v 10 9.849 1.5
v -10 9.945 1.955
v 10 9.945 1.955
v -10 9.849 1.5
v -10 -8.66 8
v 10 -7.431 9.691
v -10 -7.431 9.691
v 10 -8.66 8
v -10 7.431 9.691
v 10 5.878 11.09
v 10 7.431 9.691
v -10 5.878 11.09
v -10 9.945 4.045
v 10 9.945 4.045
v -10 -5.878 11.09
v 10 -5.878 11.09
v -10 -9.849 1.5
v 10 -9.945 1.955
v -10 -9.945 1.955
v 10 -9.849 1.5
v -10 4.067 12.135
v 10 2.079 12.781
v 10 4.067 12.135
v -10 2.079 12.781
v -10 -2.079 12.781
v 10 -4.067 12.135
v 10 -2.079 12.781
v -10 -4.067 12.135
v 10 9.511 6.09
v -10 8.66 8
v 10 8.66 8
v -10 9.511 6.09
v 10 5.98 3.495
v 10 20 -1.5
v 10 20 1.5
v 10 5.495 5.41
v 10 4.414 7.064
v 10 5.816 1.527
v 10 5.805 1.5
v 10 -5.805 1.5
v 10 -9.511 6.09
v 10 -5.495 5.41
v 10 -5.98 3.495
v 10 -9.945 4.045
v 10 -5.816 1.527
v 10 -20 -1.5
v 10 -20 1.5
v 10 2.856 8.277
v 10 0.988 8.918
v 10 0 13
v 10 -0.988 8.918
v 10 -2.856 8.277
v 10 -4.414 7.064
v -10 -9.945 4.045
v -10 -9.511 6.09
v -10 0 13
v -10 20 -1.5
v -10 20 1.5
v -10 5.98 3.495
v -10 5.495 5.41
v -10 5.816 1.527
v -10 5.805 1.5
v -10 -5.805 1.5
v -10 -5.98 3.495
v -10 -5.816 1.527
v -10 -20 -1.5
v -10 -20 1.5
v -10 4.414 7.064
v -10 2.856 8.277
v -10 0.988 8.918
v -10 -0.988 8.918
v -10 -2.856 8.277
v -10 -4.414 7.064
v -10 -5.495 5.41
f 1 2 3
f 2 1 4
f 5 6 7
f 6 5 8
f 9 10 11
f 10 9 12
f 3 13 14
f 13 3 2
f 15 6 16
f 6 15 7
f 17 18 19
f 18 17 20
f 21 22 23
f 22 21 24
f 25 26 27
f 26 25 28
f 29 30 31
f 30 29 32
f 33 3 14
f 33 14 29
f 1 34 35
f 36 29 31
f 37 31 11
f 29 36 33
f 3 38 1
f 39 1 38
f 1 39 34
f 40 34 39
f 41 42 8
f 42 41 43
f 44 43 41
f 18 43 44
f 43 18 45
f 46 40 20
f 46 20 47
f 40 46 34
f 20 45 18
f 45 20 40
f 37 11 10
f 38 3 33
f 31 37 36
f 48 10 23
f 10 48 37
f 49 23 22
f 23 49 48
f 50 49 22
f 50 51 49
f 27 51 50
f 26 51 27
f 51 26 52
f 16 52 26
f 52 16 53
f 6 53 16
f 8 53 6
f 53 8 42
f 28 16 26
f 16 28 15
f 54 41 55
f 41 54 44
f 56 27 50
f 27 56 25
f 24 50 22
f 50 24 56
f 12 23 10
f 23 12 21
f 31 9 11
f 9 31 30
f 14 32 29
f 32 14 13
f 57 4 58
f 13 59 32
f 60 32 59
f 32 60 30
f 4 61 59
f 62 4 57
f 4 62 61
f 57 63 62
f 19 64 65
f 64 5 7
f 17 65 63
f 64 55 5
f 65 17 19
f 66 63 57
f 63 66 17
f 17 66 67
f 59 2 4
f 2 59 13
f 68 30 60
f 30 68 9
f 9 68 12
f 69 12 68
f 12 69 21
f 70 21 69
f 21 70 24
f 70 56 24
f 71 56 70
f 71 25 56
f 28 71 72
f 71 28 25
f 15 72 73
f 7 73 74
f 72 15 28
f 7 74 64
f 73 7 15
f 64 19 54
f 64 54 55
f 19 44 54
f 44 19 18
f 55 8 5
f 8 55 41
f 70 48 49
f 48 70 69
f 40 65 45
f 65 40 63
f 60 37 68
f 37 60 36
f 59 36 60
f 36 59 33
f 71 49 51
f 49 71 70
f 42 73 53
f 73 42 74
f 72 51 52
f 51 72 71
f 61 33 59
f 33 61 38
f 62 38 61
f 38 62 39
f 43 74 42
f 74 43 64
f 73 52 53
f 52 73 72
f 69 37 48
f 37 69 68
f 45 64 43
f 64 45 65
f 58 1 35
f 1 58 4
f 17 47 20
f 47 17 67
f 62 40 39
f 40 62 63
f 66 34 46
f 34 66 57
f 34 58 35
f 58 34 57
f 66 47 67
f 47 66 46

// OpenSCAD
width = 20.0;
length = 40.0;
thickness = 3.0;

clip_width = 20;
clip_id = 12.0;
clip_od = 20;

module ski_clip()
{
    union()
    {
            cube([width,length,thickness], center=true);
    translate([0,0,thickness]) difference()
    {
        union()
        {
            rotate([0,90,0]) cylinder(clip_width,clip_od/2,clip_od/2, center=true);
        }
        rotate([0,90,0]) cylinder(clip_width+0.1,clip_id/2,clip_id/2, center=true);
        translate([0,0,-clip_width/2-thickness]) cube([clip_width+0.1,clip_od,clip_width], center=true);
    }
}
}


ski_clip();
